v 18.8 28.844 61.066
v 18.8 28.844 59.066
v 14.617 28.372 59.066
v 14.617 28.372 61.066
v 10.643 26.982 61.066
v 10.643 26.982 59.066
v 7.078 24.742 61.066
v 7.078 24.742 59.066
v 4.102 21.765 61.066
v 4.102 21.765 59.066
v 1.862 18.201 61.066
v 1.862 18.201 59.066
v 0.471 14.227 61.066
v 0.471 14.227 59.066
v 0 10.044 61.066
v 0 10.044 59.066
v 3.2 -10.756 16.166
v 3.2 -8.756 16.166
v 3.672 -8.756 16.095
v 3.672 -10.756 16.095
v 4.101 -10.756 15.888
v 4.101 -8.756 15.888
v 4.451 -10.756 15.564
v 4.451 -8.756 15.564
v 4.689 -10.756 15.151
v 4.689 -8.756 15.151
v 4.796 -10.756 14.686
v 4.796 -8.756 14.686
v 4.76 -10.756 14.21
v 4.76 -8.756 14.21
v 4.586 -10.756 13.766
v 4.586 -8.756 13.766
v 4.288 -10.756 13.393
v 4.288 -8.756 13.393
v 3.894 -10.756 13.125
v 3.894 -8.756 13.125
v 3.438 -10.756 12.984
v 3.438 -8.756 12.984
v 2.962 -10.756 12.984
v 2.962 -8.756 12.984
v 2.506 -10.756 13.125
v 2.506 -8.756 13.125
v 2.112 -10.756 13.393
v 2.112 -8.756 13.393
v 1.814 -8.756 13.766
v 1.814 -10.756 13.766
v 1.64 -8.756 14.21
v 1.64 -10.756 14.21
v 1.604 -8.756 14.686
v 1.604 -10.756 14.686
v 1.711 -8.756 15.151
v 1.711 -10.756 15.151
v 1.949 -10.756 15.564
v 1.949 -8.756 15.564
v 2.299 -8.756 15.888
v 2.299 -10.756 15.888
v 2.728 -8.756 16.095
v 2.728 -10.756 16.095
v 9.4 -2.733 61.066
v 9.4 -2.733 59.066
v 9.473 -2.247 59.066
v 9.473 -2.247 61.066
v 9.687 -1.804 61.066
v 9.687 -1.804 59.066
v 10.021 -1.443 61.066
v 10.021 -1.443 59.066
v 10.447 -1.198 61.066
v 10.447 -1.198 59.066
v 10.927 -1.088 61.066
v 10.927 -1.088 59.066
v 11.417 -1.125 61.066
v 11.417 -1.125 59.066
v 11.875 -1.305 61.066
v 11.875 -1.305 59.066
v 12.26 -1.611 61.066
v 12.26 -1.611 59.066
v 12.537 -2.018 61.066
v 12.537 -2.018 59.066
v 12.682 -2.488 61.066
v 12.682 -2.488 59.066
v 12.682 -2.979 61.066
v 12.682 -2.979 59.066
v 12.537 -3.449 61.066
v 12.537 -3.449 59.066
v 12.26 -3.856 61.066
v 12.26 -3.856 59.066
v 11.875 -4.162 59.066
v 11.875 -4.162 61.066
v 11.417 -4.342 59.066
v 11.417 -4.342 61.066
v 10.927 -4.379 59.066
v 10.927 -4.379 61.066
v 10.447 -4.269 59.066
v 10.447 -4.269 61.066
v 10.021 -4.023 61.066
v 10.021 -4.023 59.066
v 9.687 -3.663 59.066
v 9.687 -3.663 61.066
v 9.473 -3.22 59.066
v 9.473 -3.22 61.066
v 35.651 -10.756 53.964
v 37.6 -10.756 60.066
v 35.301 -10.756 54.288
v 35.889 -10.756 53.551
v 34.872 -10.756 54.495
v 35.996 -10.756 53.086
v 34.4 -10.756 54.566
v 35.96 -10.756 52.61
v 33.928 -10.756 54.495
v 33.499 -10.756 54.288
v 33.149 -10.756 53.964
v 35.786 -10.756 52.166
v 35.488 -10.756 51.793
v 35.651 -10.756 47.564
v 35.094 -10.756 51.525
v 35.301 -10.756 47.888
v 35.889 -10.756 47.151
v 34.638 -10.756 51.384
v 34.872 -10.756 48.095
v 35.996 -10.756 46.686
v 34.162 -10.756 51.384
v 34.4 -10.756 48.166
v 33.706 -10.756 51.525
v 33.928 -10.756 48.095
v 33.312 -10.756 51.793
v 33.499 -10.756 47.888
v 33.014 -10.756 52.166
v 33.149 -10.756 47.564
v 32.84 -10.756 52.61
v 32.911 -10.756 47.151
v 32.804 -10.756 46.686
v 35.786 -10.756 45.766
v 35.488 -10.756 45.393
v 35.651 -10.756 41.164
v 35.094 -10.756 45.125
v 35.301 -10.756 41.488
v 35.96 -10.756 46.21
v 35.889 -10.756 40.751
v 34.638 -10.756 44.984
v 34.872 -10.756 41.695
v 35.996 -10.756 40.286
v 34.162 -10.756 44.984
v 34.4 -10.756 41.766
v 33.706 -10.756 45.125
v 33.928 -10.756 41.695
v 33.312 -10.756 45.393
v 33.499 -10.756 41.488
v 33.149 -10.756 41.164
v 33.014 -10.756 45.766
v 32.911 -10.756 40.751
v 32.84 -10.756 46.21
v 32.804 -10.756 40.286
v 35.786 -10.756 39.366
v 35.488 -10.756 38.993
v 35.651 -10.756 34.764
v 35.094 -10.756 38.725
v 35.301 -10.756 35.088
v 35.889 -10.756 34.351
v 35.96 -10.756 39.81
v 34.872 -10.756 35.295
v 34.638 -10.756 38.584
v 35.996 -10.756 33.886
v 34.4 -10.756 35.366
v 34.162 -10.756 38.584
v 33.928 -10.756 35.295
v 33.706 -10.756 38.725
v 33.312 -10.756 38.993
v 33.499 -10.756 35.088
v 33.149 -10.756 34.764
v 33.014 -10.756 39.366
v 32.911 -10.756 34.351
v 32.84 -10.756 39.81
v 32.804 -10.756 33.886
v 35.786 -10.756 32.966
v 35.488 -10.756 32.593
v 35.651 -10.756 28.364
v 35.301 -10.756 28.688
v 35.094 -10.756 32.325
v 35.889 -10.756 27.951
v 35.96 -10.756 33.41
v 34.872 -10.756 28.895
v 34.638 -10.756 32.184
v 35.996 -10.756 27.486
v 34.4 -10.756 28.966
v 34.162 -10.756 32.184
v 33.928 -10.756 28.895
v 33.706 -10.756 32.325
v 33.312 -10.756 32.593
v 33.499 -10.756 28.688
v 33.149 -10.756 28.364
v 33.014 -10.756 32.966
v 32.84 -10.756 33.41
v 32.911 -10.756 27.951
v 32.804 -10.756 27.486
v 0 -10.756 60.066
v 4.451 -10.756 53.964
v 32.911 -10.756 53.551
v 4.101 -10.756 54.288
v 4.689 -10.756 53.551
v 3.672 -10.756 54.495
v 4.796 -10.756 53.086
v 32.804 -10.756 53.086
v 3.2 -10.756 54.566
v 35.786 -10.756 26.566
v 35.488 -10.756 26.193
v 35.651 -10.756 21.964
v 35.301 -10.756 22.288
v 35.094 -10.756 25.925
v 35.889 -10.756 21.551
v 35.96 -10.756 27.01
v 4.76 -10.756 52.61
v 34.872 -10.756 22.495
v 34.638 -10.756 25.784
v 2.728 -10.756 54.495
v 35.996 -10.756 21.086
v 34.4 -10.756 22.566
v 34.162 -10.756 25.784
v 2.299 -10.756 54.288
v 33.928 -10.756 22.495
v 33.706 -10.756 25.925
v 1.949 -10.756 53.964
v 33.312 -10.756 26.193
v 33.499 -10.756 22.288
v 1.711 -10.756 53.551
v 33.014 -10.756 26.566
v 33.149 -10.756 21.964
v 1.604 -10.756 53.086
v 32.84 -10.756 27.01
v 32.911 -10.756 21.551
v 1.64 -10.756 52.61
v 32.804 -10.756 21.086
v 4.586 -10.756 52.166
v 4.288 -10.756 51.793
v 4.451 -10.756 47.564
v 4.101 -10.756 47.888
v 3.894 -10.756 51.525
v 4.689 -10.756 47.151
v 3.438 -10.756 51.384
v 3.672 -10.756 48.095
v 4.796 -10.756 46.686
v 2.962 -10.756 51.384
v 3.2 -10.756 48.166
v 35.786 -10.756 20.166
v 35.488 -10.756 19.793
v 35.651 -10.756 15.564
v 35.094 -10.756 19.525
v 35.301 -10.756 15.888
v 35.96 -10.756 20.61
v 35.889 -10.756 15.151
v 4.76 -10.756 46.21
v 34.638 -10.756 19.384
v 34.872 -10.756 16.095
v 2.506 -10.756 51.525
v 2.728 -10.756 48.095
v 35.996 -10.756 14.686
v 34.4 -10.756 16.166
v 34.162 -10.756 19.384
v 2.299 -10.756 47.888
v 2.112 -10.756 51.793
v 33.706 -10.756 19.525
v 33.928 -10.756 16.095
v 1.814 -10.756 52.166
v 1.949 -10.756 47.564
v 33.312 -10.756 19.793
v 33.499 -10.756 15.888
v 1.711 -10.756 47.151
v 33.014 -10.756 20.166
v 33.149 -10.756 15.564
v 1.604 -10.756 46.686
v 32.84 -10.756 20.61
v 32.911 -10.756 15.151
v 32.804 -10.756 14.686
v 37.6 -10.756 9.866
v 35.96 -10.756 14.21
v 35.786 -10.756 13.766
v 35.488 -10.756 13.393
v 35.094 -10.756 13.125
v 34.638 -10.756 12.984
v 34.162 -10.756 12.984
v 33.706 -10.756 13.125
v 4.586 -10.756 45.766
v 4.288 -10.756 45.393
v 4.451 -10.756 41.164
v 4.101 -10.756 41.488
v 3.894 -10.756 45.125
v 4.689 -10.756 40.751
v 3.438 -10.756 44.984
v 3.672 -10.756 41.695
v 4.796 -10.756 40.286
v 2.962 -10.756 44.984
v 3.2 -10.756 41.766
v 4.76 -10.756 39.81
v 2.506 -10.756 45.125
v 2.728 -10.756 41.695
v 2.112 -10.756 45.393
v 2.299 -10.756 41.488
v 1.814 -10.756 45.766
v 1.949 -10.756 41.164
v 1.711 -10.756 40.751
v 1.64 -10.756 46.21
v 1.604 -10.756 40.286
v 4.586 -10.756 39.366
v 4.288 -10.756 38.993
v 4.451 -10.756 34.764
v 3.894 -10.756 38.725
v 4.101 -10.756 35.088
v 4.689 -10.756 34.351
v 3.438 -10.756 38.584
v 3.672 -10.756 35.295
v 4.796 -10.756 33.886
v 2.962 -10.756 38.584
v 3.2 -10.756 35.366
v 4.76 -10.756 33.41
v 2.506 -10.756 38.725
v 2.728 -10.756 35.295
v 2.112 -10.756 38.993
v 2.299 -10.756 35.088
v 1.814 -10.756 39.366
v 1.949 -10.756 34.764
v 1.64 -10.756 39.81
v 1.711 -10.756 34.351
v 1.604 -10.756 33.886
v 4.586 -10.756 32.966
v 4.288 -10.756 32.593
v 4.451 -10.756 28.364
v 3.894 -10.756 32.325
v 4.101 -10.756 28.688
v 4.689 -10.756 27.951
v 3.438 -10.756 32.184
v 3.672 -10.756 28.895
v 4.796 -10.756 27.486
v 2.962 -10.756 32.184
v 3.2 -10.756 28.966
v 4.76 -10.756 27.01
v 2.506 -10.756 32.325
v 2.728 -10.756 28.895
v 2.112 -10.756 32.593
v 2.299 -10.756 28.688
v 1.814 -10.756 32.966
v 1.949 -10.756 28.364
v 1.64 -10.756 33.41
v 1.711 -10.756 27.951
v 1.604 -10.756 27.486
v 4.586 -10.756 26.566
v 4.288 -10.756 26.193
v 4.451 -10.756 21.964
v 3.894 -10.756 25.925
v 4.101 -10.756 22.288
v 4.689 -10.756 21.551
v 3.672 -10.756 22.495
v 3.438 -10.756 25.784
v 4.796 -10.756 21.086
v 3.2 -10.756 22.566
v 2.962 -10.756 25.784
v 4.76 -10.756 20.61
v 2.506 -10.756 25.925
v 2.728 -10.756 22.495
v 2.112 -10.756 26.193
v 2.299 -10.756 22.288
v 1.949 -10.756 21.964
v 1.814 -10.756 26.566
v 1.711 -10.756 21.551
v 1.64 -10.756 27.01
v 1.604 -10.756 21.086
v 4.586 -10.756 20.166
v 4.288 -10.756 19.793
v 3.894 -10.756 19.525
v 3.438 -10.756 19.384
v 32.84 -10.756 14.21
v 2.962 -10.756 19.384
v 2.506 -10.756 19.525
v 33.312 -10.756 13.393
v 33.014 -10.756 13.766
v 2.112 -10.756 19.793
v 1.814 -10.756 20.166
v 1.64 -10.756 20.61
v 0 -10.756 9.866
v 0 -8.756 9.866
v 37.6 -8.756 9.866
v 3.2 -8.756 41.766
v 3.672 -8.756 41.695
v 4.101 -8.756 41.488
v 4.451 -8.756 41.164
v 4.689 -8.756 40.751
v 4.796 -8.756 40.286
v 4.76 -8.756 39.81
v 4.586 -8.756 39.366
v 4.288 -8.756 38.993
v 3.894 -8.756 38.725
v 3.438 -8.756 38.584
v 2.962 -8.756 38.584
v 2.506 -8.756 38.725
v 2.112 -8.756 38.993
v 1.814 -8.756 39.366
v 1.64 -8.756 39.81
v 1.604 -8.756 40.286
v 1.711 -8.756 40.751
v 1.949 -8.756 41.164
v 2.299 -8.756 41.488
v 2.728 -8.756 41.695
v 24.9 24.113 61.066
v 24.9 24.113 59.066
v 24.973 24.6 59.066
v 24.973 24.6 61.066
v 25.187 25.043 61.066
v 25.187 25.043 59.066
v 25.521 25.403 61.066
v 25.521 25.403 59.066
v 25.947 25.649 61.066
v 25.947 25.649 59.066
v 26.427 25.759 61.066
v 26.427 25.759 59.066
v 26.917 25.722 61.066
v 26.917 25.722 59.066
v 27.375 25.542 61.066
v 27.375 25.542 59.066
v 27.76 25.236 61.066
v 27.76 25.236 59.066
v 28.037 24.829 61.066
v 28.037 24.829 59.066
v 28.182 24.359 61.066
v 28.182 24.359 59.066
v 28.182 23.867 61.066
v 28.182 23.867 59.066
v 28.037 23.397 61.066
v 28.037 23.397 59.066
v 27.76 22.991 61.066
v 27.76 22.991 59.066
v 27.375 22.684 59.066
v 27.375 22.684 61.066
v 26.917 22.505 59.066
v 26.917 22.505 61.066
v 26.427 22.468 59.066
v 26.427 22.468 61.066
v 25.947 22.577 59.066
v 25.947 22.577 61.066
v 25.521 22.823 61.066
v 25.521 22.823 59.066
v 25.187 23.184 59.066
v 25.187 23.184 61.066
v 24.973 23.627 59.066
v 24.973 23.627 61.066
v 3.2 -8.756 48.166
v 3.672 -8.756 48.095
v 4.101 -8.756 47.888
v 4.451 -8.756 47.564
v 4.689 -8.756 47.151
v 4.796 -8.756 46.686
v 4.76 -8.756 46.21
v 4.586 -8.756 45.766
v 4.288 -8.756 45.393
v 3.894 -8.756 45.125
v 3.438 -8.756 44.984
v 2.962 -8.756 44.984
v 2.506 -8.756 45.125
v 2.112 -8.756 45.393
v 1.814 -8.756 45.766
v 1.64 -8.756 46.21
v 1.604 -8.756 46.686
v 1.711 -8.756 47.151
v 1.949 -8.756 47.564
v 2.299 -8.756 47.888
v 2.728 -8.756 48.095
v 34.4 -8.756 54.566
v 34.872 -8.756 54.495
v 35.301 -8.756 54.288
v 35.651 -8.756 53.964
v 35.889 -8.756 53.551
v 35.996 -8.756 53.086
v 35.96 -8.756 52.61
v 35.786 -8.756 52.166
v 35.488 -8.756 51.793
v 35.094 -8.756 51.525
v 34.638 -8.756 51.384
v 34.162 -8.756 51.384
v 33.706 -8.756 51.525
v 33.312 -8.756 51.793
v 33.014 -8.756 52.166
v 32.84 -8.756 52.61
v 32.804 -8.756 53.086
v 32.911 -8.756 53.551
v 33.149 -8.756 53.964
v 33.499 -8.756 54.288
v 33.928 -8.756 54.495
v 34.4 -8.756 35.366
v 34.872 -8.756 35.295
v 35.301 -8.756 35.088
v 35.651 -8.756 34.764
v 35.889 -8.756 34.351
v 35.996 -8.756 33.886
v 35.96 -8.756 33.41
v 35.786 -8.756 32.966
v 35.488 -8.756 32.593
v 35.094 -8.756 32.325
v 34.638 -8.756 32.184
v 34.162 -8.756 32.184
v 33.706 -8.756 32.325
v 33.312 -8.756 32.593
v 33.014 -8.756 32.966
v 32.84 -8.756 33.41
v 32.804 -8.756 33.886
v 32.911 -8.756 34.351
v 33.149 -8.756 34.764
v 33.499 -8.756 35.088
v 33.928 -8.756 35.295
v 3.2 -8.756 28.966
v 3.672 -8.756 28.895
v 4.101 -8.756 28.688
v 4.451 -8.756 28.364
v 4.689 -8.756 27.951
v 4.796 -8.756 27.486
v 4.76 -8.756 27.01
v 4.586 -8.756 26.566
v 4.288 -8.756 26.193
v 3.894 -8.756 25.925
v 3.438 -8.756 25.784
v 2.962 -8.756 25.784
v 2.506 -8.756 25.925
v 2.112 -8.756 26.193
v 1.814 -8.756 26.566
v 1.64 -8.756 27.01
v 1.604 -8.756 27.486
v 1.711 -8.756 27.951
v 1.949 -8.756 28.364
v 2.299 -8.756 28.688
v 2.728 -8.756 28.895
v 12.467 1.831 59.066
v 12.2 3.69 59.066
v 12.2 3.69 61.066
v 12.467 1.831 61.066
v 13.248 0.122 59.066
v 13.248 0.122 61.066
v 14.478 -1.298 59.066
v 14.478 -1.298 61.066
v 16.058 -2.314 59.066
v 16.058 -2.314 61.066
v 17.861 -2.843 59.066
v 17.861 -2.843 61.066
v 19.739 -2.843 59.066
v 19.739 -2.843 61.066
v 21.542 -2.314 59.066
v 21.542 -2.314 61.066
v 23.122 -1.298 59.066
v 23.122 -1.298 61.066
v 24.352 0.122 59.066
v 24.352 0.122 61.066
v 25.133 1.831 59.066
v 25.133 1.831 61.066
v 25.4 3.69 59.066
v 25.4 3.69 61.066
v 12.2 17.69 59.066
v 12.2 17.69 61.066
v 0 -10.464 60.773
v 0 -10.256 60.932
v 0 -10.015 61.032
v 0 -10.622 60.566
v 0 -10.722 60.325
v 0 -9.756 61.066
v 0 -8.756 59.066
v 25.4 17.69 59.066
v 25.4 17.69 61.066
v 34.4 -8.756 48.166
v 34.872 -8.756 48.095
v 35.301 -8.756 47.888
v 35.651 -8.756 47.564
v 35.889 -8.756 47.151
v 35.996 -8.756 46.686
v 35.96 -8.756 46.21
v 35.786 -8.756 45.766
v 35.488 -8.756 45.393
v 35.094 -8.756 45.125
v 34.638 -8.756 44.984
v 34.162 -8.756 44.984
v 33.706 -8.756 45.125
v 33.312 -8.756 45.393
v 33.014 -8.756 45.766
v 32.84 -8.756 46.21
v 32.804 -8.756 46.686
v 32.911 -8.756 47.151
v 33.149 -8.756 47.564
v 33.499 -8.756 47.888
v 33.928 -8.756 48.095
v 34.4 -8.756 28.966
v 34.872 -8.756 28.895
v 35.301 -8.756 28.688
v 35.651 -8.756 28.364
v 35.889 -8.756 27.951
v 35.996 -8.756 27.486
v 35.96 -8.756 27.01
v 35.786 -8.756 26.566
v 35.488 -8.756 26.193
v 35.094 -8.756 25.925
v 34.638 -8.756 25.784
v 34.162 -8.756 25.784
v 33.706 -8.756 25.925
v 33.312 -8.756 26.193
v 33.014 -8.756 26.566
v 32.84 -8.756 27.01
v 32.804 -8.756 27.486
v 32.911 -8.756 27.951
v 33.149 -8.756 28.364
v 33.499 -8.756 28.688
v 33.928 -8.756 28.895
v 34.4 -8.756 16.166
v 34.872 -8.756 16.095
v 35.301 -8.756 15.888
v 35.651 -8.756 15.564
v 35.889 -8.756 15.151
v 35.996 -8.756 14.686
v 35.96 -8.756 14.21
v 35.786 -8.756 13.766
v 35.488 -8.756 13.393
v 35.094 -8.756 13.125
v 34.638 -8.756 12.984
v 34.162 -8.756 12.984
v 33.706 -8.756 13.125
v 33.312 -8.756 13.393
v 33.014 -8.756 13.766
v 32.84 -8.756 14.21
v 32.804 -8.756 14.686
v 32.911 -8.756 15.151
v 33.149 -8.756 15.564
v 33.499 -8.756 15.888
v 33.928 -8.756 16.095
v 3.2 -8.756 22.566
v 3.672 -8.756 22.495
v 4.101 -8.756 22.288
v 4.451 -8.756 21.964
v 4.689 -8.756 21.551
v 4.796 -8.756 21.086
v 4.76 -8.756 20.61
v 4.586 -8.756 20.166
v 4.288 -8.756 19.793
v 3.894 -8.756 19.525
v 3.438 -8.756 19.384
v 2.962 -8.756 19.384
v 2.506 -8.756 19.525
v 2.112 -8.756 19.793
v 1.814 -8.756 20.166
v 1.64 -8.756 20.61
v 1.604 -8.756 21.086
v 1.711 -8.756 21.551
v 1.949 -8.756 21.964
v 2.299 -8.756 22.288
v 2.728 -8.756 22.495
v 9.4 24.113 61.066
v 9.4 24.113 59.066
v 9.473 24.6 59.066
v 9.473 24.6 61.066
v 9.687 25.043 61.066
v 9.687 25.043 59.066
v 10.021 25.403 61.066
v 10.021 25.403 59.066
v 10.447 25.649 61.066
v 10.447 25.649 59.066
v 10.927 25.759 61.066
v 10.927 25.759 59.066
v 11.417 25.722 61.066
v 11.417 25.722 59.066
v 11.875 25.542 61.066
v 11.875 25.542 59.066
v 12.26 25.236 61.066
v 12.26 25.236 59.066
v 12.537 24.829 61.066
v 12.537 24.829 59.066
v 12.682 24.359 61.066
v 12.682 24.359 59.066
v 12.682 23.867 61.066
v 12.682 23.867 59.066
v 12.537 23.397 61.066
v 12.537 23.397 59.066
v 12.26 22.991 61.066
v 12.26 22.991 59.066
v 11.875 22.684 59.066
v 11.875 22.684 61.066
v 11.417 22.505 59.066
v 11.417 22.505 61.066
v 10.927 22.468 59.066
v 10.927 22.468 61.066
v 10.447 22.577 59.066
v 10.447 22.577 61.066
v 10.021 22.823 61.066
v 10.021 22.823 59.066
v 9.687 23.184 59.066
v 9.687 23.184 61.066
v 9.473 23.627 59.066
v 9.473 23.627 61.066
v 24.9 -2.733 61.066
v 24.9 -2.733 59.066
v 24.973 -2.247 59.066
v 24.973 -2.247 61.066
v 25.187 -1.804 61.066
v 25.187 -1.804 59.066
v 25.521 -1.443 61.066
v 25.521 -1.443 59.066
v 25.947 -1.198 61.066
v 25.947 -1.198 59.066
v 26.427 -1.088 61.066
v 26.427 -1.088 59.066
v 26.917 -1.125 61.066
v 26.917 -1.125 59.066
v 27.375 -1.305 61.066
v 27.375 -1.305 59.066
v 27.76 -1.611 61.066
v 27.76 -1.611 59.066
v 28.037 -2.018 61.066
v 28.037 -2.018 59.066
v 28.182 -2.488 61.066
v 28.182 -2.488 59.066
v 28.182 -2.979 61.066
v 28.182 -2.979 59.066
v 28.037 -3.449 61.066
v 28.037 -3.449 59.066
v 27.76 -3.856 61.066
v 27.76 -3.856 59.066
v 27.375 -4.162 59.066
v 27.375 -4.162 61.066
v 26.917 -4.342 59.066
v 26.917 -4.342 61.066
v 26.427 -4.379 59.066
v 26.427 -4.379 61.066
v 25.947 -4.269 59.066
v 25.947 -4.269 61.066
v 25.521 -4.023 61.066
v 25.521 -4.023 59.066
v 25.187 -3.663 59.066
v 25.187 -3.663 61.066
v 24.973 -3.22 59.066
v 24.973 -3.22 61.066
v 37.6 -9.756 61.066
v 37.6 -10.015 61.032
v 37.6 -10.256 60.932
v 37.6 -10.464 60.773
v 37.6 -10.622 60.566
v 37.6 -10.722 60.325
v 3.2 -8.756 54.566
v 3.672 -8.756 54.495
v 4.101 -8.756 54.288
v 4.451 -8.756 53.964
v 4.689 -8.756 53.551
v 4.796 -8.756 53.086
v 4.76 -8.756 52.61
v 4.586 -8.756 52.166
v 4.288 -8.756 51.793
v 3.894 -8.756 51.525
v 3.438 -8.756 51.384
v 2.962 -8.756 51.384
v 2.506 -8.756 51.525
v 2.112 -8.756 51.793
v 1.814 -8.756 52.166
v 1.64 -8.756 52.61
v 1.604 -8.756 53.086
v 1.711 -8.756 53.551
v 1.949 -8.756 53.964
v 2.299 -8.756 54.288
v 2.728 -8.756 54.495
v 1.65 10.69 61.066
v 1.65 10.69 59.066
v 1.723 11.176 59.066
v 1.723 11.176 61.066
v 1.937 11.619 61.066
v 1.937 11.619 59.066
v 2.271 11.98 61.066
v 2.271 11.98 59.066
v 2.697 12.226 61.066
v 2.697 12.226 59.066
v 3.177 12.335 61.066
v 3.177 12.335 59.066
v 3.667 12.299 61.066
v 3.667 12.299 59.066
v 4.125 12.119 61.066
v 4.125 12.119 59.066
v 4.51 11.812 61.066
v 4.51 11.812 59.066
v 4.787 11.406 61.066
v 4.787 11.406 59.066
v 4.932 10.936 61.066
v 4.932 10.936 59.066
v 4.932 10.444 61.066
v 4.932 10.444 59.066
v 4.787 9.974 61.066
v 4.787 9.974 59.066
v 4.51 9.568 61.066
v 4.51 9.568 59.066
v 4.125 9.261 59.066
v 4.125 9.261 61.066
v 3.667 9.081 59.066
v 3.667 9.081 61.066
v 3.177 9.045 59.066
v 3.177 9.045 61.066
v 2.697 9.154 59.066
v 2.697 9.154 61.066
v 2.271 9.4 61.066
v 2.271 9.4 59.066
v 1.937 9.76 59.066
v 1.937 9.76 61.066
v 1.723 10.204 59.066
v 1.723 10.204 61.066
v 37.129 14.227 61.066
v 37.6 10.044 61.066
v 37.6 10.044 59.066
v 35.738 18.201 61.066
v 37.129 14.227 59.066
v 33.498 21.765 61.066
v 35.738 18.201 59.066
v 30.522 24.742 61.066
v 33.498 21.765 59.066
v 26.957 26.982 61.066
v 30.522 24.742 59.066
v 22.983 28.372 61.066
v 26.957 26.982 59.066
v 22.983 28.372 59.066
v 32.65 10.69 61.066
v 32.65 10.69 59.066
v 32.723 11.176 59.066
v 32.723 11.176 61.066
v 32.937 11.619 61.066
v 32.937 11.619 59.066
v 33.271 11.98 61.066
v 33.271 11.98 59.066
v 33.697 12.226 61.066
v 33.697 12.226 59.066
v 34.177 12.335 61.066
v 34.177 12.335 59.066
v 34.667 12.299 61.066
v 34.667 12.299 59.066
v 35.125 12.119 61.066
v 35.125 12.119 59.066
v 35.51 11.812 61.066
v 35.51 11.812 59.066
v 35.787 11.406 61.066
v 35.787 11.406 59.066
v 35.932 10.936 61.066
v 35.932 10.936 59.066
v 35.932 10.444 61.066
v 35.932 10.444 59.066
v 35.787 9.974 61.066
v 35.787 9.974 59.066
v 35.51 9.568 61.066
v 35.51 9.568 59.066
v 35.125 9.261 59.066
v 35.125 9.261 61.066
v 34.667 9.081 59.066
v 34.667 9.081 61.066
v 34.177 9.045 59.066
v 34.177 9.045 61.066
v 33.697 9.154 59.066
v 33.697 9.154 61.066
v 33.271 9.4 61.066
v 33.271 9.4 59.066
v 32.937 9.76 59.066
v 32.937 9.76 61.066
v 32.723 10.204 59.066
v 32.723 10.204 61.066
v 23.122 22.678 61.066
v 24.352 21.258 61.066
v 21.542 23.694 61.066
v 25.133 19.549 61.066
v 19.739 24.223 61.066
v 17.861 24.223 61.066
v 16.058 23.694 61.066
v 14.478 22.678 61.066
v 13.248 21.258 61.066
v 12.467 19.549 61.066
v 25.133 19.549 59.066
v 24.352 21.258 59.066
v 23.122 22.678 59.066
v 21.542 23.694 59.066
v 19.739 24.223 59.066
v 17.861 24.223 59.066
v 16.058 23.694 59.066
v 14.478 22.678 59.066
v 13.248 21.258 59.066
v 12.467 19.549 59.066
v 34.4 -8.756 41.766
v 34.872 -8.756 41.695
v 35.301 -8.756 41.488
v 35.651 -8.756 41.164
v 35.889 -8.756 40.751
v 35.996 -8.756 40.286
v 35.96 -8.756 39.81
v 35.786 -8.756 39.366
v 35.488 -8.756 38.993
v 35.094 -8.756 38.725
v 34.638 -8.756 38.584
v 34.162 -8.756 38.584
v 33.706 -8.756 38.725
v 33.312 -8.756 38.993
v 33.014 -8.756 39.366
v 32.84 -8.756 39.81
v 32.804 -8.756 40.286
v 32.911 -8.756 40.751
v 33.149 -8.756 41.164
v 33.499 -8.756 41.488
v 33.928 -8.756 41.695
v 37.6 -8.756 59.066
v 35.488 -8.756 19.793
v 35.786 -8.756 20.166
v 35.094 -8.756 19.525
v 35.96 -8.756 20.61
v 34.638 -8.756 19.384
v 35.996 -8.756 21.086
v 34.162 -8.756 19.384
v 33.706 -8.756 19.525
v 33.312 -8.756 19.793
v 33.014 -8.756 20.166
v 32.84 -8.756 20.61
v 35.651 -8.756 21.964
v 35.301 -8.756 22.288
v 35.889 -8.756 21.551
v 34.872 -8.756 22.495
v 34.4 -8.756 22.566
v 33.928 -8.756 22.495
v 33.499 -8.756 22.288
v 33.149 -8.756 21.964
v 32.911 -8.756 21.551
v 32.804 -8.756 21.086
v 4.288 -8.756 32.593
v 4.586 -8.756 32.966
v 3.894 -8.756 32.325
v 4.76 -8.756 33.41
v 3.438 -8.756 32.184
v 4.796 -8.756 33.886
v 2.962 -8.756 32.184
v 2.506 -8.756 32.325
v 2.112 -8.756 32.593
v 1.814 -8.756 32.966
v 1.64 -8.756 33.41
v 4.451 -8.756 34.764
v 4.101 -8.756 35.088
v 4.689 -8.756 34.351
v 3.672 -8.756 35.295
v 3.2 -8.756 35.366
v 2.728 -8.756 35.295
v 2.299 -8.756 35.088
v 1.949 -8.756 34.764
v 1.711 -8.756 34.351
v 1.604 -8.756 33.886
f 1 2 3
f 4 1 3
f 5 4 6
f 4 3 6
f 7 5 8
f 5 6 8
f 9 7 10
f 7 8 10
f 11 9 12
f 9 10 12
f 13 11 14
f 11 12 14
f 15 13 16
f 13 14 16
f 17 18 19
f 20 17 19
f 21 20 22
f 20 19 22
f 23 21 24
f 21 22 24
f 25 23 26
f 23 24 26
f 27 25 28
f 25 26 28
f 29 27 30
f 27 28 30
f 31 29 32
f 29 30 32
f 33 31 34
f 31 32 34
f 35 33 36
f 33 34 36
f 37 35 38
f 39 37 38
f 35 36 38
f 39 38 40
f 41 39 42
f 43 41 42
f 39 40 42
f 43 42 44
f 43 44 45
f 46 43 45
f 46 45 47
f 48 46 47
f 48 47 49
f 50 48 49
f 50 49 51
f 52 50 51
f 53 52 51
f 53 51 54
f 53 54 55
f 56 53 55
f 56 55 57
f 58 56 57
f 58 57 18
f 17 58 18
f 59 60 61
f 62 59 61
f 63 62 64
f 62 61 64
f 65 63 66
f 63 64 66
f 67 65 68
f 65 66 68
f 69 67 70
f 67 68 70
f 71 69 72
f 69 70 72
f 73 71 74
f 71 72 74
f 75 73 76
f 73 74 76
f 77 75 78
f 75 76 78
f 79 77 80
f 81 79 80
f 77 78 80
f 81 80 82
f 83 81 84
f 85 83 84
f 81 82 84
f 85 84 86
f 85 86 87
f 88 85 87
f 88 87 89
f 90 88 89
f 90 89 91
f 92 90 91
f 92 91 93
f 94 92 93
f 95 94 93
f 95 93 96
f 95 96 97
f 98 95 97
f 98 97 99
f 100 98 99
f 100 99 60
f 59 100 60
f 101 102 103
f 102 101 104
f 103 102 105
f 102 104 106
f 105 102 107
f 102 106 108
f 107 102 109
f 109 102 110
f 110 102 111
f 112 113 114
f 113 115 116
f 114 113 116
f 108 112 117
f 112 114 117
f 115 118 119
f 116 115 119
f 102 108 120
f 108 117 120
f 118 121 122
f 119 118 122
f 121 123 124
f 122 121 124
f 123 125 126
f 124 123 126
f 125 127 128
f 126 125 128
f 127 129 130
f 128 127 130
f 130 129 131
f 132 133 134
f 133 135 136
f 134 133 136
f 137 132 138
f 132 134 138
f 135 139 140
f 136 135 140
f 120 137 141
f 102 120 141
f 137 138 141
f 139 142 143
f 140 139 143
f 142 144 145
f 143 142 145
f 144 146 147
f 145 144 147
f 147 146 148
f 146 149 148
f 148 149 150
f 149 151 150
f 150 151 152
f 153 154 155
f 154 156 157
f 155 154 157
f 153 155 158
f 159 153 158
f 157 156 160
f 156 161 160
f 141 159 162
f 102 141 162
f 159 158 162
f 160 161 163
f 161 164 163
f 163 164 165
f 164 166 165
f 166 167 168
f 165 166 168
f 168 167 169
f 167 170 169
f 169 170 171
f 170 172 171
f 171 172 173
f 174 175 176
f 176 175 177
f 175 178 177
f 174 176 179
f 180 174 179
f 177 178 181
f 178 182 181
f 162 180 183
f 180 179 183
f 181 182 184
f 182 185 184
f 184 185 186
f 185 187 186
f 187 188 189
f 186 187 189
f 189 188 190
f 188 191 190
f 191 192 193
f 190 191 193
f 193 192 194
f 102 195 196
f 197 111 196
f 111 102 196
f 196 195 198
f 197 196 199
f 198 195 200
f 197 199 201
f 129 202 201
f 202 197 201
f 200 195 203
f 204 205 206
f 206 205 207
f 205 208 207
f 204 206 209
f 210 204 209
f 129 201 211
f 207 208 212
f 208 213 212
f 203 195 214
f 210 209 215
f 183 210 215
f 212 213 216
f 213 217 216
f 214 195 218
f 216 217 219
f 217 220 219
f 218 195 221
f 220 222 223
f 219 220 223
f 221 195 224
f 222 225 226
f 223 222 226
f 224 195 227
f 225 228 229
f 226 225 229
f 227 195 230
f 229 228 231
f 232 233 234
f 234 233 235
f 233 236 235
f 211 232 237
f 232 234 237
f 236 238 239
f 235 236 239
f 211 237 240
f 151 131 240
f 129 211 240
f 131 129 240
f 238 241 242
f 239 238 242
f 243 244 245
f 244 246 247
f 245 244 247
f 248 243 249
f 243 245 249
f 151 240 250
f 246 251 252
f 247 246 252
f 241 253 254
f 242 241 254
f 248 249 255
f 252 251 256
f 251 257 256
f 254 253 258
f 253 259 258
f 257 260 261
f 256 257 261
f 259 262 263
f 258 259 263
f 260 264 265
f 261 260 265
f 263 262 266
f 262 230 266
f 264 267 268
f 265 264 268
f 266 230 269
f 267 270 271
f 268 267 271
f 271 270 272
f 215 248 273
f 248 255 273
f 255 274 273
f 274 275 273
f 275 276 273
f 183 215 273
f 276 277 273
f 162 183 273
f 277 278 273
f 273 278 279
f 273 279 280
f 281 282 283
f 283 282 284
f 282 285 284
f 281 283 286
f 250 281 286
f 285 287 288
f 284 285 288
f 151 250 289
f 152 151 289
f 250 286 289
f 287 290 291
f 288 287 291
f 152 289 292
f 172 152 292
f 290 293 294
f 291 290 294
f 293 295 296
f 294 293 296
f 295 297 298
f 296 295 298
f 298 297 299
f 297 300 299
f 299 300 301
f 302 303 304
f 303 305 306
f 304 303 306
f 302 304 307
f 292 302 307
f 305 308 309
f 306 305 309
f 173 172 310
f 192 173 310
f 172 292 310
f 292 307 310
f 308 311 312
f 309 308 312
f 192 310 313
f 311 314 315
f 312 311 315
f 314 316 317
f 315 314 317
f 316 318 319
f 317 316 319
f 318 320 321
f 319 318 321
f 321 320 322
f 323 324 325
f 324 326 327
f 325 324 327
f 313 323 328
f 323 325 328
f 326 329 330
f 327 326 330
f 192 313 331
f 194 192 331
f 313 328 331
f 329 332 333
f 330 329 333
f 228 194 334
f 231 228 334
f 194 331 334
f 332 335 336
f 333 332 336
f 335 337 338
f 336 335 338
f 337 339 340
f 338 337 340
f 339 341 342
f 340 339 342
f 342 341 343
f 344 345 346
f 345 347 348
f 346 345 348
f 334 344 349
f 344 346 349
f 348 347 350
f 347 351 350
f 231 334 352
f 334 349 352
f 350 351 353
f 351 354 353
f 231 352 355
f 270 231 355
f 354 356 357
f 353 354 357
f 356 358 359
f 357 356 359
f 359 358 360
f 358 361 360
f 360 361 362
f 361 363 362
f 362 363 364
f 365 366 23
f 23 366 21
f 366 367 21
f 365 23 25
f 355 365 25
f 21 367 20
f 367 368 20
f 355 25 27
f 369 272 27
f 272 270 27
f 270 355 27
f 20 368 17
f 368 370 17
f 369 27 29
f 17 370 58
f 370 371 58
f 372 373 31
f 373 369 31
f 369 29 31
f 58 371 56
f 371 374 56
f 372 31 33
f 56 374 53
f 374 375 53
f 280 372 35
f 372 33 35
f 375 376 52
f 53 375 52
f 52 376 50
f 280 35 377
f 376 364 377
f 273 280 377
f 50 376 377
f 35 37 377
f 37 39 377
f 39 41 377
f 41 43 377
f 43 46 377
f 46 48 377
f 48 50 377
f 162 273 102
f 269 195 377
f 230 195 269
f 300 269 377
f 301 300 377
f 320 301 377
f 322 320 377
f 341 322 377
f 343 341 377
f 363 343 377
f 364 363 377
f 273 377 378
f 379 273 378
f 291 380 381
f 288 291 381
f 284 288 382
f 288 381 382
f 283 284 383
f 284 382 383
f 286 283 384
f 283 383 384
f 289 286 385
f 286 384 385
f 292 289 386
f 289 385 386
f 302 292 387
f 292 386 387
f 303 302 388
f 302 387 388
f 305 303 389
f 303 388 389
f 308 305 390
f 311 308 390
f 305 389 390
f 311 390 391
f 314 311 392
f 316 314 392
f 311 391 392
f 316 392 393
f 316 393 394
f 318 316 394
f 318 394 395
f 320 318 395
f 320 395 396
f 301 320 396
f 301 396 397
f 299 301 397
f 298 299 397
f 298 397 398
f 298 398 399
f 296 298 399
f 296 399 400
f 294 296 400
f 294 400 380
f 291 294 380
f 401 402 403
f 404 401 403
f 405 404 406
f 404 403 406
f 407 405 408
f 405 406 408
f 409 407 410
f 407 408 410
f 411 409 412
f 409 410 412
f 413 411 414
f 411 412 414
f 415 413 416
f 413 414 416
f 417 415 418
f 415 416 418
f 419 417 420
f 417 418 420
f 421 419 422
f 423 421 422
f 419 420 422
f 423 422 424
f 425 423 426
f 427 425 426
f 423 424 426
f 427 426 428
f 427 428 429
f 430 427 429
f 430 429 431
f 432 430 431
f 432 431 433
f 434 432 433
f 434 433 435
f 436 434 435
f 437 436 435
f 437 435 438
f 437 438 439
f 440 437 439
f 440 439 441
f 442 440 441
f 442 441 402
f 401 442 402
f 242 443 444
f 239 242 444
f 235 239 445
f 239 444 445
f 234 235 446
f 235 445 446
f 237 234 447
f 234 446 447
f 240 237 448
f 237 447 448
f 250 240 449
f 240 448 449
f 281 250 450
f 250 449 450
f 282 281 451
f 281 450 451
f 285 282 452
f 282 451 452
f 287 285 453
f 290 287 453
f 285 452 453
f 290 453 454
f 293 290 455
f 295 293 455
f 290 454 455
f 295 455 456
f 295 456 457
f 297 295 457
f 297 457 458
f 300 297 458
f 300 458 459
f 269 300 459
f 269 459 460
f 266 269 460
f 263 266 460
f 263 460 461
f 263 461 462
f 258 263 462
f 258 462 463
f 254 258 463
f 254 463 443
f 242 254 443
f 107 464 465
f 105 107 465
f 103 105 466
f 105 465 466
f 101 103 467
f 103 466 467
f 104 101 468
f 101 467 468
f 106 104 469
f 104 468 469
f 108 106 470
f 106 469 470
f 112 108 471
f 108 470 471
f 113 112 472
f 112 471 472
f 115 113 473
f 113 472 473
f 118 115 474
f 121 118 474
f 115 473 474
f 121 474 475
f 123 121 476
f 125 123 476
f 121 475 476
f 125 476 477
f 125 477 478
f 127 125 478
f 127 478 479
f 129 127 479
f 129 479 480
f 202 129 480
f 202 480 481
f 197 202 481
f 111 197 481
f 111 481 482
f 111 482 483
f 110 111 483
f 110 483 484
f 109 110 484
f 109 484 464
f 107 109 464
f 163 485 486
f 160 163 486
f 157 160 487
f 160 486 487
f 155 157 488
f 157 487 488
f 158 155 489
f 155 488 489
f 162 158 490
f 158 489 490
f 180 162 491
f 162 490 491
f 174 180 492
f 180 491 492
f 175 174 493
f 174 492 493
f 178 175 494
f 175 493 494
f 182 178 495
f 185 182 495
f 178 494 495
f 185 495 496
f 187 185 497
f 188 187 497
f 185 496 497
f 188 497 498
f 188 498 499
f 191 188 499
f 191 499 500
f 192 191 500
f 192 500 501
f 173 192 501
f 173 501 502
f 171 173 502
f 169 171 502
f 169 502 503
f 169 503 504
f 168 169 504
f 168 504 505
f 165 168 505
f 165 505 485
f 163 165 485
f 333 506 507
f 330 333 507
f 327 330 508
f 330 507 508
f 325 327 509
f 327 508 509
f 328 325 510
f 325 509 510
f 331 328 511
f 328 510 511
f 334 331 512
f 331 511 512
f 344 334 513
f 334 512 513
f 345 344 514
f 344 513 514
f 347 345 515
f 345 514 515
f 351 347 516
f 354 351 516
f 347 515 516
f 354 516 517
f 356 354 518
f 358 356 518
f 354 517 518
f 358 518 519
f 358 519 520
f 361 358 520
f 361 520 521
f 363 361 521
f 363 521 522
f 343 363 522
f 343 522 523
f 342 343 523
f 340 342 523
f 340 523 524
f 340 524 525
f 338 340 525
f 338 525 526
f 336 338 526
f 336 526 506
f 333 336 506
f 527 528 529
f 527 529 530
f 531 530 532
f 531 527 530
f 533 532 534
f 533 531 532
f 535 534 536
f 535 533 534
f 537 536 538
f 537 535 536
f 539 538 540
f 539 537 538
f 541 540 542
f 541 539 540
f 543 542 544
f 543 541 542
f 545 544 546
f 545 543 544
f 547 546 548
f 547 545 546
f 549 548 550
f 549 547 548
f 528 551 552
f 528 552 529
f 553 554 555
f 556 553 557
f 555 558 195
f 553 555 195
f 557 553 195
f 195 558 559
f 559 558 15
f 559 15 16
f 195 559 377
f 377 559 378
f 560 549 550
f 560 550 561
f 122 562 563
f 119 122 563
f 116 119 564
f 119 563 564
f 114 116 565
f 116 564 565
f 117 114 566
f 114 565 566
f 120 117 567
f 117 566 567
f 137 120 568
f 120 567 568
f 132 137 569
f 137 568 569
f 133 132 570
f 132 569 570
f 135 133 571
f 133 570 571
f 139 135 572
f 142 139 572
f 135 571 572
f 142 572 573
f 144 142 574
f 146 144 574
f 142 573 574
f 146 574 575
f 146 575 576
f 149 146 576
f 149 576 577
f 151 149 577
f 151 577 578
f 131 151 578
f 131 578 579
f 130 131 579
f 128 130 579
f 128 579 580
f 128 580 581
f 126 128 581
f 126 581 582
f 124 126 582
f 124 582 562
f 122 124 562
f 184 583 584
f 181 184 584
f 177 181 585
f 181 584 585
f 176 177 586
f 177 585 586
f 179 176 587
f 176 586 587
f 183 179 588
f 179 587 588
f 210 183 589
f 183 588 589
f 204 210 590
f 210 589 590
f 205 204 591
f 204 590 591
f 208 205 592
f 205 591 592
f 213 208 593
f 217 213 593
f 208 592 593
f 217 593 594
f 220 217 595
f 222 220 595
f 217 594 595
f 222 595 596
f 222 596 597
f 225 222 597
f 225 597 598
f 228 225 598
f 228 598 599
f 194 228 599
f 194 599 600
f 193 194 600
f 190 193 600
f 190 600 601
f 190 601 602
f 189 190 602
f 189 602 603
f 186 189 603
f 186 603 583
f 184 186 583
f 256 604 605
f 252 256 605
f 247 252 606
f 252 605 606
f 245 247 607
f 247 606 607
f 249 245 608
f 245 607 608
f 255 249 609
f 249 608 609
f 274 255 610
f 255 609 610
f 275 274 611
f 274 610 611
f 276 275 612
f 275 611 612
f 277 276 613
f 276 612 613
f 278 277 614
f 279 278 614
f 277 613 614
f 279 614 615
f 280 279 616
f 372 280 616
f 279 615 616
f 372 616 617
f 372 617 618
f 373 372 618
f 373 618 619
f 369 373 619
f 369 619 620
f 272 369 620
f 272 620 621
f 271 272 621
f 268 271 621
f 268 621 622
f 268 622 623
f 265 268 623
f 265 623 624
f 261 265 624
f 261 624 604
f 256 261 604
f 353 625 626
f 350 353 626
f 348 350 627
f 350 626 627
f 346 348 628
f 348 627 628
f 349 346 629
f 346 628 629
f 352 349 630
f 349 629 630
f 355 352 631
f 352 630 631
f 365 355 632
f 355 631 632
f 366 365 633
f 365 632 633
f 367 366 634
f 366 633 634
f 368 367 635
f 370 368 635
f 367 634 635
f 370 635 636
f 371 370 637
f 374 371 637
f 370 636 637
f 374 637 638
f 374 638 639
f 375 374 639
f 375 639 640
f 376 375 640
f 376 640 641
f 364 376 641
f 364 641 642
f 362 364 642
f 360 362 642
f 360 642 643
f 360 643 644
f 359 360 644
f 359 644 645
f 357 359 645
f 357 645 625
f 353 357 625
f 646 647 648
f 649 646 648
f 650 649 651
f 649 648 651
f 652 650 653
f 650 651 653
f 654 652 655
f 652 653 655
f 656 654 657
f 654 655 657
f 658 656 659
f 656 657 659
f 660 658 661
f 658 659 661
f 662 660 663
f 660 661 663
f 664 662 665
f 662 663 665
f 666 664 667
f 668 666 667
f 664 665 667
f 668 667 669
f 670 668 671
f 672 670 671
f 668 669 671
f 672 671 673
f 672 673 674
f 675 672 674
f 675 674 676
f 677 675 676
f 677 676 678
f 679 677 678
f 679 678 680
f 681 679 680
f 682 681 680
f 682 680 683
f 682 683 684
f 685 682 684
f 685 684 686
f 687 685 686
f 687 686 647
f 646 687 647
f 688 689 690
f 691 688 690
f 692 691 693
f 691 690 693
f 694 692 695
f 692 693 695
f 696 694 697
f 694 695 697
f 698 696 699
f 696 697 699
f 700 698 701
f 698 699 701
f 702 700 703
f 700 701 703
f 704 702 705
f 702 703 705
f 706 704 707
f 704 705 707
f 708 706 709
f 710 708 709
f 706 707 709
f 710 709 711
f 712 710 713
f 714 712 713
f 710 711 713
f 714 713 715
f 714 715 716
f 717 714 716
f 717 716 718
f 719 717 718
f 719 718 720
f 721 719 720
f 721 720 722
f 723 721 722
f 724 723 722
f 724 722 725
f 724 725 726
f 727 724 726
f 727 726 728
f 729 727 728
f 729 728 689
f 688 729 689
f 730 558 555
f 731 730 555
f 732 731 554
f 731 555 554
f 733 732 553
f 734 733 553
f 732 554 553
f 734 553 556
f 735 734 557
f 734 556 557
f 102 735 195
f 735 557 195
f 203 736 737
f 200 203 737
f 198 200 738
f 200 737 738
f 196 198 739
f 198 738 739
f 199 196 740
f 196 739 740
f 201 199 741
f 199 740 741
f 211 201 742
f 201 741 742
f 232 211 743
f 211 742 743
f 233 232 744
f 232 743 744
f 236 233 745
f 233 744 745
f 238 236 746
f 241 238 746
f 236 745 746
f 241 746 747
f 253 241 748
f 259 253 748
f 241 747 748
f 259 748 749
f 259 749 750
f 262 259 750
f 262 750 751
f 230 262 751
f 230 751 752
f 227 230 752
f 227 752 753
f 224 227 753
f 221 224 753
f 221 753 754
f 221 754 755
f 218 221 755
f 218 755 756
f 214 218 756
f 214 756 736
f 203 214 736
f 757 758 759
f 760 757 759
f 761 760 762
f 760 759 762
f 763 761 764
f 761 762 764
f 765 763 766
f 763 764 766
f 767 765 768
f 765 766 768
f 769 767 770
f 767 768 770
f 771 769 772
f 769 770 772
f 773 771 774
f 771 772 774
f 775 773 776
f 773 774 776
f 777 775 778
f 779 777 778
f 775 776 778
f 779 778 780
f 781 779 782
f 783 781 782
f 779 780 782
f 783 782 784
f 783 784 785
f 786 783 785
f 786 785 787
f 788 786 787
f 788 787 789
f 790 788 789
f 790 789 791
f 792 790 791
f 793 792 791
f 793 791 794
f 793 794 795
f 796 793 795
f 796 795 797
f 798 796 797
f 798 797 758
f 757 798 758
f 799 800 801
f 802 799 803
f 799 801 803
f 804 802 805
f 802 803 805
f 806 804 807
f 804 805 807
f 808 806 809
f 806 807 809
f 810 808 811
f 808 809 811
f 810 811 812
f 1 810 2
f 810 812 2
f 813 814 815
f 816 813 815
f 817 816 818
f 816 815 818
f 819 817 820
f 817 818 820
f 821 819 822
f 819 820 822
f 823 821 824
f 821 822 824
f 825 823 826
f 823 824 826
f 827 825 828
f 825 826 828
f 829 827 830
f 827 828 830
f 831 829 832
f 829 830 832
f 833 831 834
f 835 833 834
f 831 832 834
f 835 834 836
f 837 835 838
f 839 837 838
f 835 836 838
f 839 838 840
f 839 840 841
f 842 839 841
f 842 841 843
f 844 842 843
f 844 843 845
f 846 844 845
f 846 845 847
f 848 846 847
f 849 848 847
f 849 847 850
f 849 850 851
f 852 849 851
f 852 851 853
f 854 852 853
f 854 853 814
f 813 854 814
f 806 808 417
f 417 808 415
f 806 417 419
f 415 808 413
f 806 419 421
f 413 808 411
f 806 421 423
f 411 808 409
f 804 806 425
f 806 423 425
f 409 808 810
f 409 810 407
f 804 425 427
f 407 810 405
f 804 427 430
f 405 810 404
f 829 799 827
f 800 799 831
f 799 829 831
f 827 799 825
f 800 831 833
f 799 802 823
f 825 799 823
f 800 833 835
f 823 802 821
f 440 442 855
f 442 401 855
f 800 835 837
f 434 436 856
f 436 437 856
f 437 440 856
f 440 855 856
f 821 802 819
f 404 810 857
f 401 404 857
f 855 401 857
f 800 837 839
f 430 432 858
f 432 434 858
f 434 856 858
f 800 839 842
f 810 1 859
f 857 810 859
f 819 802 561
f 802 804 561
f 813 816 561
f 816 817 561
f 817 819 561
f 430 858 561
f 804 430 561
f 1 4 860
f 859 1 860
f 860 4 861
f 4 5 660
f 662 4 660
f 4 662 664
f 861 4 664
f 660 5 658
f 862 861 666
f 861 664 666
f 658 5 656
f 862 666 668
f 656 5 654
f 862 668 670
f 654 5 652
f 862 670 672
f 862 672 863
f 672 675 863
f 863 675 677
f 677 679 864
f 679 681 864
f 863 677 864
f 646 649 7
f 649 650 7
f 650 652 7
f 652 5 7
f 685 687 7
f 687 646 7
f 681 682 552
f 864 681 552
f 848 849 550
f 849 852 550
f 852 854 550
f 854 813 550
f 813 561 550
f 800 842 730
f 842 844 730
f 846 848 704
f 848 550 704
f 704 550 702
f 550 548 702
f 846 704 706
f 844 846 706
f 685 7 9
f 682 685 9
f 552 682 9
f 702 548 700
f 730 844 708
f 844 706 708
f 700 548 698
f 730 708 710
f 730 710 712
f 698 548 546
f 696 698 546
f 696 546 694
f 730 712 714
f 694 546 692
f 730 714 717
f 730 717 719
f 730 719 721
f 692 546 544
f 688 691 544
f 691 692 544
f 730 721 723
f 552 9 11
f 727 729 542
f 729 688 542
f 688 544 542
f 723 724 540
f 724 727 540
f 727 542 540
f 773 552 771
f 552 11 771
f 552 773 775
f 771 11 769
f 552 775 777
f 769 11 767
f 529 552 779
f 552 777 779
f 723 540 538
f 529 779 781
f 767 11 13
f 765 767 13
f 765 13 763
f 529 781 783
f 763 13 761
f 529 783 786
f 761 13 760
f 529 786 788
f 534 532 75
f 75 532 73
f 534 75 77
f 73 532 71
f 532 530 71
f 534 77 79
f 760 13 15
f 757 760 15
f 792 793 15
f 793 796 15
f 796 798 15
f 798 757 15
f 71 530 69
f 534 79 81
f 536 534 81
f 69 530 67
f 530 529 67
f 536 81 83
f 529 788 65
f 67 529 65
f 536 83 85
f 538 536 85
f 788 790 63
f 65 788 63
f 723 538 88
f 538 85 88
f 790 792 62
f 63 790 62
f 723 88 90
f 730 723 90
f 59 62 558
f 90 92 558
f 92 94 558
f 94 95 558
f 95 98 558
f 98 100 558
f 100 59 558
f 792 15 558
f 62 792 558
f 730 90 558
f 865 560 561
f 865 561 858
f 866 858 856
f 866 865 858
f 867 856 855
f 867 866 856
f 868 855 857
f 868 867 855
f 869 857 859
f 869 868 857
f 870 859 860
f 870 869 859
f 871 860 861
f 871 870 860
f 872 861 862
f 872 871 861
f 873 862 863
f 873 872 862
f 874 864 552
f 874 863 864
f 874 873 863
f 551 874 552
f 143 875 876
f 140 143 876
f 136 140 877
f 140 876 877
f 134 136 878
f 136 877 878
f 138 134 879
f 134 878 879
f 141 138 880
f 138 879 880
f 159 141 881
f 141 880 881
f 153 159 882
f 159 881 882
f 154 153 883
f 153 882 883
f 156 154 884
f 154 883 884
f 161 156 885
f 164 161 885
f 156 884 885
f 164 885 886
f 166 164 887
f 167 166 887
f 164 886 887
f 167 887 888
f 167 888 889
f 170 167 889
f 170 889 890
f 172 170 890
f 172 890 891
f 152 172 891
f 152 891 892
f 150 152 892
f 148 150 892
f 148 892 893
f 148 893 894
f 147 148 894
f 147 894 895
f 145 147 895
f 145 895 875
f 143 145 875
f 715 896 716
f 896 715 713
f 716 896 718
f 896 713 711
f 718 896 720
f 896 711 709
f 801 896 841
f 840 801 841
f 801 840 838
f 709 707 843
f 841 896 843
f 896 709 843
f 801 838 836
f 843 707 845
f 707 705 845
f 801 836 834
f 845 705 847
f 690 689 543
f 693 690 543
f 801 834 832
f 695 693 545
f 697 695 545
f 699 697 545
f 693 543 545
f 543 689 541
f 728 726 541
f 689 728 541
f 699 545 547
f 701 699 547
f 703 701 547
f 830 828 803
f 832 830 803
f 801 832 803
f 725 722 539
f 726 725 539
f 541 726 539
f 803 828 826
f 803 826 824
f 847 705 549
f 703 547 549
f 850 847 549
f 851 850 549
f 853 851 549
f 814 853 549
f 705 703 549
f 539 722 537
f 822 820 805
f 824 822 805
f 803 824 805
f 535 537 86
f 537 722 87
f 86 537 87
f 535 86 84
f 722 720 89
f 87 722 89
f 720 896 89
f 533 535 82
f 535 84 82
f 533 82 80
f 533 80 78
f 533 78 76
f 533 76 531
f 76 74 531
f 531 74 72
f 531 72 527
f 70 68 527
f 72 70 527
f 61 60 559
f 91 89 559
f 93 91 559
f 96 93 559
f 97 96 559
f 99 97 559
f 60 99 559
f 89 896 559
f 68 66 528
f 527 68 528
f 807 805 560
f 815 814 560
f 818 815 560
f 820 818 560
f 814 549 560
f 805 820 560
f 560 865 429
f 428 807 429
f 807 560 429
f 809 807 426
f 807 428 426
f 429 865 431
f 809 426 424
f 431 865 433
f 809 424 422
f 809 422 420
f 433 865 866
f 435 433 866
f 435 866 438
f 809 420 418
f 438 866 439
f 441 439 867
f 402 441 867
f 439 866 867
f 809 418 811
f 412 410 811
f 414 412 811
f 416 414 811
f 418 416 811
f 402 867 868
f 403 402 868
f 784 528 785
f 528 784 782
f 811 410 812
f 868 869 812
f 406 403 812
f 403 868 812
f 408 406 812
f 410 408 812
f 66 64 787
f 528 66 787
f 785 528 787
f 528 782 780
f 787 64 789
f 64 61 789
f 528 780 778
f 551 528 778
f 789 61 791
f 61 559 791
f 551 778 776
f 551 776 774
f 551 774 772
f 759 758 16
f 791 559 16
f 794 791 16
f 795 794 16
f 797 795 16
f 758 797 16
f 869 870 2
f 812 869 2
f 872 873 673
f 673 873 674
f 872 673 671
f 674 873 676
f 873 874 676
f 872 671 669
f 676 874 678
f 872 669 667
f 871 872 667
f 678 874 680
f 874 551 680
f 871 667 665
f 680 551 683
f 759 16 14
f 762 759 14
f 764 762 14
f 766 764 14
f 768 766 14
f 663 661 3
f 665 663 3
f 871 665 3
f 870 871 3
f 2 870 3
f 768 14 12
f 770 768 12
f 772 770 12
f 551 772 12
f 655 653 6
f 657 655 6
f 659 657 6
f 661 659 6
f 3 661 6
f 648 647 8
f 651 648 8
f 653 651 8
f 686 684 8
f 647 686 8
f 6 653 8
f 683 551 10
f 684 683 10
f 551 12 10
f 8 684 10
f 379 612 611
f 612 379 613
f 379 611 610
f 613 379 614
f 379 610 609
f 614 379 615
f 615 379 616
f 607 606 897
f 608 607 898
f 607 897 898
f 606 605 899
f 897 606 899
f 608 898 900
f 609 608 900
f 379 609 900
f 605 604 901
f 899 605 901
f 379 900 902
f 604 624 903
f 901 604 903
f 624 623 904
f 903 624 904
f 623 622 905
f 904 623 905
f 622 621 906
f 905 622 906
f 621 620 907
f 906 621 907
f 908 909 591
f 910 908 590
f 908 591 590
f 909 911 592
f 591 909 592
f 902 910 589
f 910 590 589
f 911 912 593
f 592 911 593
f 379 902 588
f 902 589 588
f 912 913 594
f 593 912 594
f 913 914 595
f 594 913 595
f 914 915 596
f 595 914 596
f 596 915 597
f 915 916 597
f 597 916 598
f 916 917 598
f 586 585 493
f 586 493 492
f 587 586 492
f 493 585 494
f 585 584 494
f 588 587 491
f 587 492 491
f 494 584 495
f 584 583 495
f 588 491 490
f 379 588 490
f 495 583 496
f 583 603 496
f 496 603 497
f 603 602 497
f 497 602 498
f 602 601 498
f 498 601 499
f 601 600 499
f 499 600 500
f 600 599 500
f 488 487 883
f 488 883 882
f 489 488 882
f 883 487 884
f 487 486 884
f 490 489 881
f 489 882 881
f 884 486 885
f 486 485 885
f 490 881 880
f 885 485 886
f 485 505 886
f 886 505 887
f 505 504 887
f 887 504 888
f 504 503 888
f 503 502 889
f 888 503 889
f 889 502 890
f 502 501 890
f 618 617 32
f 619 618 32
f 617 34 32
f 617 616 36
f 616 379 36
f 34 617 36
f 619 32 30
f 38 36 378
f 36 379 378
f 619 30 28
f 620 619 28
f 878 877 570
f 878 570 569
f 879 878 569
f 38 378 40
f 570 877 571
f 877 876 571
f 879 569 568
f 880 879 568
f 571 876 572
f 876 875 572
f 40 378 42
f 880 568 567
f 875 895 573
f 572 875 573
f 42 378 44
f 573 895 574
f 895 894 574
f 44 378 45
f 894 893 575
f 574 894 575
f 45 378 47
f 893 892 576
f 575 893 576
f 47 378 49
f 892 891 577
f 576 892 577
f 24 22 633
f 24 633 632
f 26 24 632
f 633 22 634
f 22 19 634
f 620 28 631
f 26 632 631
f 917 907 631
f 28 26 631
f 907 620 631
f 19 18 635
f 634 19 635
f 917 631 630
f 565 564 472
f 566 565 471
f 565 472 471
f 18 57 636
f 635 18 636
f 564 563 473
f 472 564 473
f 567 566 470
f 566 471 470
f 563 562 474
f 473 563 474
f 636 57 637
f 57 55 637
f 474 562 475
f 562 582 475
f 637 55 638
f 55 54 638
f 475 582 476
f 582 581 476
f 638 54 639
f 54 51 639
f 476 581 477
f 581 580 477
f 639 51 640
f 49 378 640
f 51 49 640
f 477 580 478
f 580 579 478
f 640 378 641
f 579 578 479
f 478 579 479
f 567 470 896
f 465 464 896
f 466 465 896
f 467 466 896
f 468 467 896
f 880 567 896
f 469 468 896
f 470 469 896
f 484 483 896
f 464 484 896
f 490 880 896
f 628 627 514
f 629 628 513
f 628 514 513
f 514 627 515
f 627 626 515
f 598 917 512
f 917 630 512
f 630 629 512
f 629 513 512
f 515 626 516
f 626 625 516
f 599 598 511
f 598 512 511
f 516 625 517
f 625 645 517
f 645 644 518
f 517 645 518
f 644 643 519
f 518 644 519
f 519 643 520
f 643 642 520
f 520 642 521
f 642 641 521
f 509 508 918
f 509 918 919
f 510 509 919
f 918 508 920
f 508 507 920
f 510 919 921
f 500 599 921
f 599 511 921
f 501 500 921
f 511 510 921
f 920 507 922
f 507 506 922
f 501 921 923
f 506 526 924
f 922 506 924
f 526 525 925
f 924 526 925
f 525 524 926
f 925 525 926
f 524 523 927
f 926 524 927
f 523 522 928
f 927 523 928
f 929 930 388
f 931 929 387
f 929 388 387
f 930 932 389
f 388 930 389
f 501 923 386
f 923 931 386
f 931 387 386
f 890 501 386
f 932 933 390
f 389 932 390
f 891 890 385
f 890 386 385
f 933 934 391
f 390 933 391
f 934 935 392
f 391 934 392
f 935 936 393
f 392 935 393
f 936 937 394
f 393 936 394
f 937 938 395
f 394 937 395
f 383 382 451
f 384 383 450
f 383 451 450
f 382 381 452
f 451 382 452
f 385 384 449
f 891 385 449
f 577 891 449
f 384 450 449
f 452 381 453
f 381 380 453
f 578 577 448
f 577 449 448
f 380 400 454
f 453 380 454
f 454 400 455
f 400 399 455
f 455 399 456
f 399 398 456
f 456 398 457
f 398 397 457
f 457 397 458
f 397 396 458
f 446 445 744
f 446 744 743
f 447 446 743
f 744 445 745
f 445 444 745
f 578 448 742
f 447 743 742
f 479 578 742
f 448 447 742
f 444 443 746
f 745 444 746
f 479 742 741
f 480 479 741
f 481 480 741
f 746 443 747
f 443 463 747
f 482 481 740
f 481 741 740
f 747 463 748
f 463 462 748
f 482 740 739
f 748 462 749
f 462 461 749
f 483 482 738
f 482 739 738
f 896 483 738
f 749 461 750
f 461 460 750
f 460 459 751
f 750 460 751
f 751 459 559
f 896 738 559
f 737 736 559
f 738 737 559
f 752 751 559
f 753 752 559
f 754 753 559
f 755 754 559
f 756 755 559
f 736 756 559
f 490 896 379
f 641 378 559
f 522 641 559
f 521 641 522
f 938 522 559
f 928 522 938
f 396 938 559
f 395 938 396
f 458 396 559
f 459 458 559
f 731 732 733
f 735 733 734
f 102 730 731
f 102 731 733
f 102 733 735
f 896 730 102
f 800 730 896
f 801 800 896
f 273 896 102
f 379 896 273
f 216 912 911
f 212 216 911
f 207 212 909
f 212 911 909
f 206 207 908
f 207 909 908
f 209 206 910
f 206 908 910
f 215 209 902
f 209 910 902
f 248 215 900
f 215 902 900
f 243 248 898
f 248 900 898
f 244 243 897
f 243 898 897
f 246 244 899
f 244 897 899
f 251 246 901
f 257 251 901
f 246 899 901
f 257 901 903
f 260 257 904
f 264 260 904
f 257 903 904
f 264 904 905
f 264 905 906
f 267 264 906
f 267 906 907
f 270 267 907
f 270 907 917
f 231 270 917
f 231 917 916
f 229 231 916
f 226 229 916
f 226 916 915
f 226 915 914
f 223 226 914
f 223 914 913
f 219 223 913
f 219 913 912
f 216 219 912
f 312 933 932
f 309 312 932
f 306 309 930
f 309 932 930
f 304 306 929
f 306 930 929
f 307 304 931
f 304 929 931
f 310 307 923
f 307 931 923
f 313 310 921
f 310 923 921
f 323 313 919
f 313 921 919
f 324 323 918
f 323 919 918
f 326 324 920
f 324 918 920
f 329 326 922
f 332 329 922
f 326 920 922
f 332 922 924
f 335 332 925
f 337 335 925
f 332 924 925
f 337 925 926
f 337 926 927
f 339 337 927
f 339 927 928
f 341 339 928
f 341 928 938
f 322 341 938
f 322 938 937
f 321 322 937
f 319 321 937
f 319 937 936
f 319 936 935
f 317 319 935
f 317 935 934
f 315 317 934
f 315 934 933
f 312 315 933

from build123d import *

# Parameters (mm, degrees)
BOSS_EXTRUDE1_DEPTH = 37.6
CUT_EXTRUDE1_DEPTH  = 69.310699879
SKETCH4_R           = 1.6
CUT_EXTRUDE2_DEPTH  = 81.972748235
SKETCH5_R           = 1.65
CUT_EXTRUDE4_DEPTH  = 69.310699879
CUT_EXTRUDE5_DEPTH  = 69.310699879


with BuildPart() as part:
    # Sketch1 → Boss-Extrude1 (new body)
    with BuildSketch(Plane(origin=(0, 0, 0), x_dir=(0, 0, -1), z_dir=(1, 0, 0))):
        with BuildLine():
            Line((-9.866078609, -8.756426748), (-59.066078609, -8.756426748))
            Line((-59.066078609, -8.756426748), (-59.066078609, 28.843573252))
            Line((-59.066078609, 28.843573252), (-61.066078609, 28.843573252))
            Line((-61.066078609, 28.843573252), (-61.066078609, -9.756426748))
            ThreePointArc((-61.066078609, -9.756426748), (-60.77318539, -10.463533529), (-60.066078609, -10.756426748))
            Line((-60.066078609, -10.756426748), (-9.866078609, -10.756426748))
            Line((-9.866078609, -10.756426748), (-9.866078609, -8.756426748))
        make_face()
    extrude(amount=BOSS_EXTRUDE1_DEPTH)

    # Sketch3 → Cut-Extrude1 (cut, through all)
    with BuildSketch(Plane(origin=(0, 0, 59.066078609), x_dir=(-1, 0, 0), z_dir=(0, 0, -1))):
        with BuildLine():
            Line((-12.2, 3.689945041), (-12.2, 17.689945041))
            ThreePointArc((-12.2, 17.689945041), (-18.8, 24.289945041), (-25.4, 17.689945041))
            Line((-25.4, 17.689945041), (-25.4, 3.689945041))
            ThreePointArc((-25.4, 3.689945041), (-18.8, -2.910054959), (-12.2, 3.689945041))
        make_face()
    extrude(amount=-CUT_EXTRUDE1_DEPTH, mode=Mode.SUBTRACT)

    # Sketch4 → Cut-Extrude2 (cut, through all)
    with BuildSketch(Plane(origin=(0, -8.756426748, 0), x_dir=(1, 0, 0), z_dir=(0, 1, 0))):
        with Locations((34.4, -14.566078609)):
            Circle(SKETCH4_R)
        with Locations((34.4, -20.966078609)):
            Circle(SKETCH4_R)
        with Locations((34.4, -27.366078609)):
            Circle(SKETCH4_R)
        with Locations((34.4, -33.766078609)):
            Circle(SKETCH4_R)
        with Locations((34.4, -40.166078609)):
            Circle(SKETCH4_R)
        with Locations((34.4, -46.566078609)):
            Circle(SKETCH4_R)
        with Locations((34.4, -52.966078609)):
            Circle(SKETCH4_R)
        with Locations((3.2, -52.966078609)):
            Circle(SKETCH4_R)
        with Locations((3.2, -46.566078609)):
            Circle(SKETCH4_R)
        with Locations((3.2, -40.166078609)):
            Circle(SKETCH4_R)
        with Locations((3.2, -33.766078609)):
            Circle(SKETCH4_R)
        with Locations((3.2, -27.366078609)):
            Circle(SKETCH4_R)
        with Locations((3.2, -20.966078609)):
            Circle(SKETCH4_R)
        with Locations((3.2, -14.566078609)):
            Circle(SKETCH4_R)
    extrude(amount=-CUT_EXTRUDE2_DEPTH, mode=Mode.SUBTRACT)

    # Sketch5 → Cut-Extrude4 (cut, through all)
    with BuildSketch(Plane(origin=(0, 0, 59.066078609), x_dir=(-1, 0, 0), z_dir=(0, 0, -1))):
        with Locations((-11.05, -2.733448718)):
            Circle(SKETCH5_R)
        with Locations((-3.3, 10.689945041)):
            Circle(SKETCH5_R)
        with Locations((-26.55, -2.733448718)):
            Circle(SKETCH5_R)
        with Locations((-34.3, 10.689945041)):
            Circle(SKETCH5_R)
        with Locations((-26.55, 24.1133388)):
            Circle(SKETCH5_R)
        with Locations((-11.05, 24.1133388)):
            Circle(SKETCH5_R)
    extrude(amount=-CUT_EXTRUDE4_DEPTH, mode=Mode.SUBTRACT)

    # Sketch6 → Cut-Extrude5 (cut, through all)
    with BuildSketch(Plane(origin=(0, 0, 59.066078609), x_dir=(-1, 0, 0), z_dir=(0, 0, -1))):
        with BuildLine():
            Line((0, 28.843573252), (-18.8, 28.843573252))
            ThreePointArc((-18.8, 28.843573252), (-5.506392514, 23.337180738), (0, 10.043573252))
            Line((0, 10.043573252), (0, 28.843573252))
        make_face()
        with BuildLine():
            Line((-37.6, 28.843573252), (-37.6, 10.043573252))
            ThreePointArc((-37.6, 10.043573252), (-32.093607486, 23.337180738), (-18.8, 28.843573252))
            Line((-18.8, 28.843573252), (-37.6, 28.843573252))
        make_face()
    extrude(amount=-CUT_EXTRUDE5_DEPTH, mode=Mode.SUBTRACT)


solid = part.part
